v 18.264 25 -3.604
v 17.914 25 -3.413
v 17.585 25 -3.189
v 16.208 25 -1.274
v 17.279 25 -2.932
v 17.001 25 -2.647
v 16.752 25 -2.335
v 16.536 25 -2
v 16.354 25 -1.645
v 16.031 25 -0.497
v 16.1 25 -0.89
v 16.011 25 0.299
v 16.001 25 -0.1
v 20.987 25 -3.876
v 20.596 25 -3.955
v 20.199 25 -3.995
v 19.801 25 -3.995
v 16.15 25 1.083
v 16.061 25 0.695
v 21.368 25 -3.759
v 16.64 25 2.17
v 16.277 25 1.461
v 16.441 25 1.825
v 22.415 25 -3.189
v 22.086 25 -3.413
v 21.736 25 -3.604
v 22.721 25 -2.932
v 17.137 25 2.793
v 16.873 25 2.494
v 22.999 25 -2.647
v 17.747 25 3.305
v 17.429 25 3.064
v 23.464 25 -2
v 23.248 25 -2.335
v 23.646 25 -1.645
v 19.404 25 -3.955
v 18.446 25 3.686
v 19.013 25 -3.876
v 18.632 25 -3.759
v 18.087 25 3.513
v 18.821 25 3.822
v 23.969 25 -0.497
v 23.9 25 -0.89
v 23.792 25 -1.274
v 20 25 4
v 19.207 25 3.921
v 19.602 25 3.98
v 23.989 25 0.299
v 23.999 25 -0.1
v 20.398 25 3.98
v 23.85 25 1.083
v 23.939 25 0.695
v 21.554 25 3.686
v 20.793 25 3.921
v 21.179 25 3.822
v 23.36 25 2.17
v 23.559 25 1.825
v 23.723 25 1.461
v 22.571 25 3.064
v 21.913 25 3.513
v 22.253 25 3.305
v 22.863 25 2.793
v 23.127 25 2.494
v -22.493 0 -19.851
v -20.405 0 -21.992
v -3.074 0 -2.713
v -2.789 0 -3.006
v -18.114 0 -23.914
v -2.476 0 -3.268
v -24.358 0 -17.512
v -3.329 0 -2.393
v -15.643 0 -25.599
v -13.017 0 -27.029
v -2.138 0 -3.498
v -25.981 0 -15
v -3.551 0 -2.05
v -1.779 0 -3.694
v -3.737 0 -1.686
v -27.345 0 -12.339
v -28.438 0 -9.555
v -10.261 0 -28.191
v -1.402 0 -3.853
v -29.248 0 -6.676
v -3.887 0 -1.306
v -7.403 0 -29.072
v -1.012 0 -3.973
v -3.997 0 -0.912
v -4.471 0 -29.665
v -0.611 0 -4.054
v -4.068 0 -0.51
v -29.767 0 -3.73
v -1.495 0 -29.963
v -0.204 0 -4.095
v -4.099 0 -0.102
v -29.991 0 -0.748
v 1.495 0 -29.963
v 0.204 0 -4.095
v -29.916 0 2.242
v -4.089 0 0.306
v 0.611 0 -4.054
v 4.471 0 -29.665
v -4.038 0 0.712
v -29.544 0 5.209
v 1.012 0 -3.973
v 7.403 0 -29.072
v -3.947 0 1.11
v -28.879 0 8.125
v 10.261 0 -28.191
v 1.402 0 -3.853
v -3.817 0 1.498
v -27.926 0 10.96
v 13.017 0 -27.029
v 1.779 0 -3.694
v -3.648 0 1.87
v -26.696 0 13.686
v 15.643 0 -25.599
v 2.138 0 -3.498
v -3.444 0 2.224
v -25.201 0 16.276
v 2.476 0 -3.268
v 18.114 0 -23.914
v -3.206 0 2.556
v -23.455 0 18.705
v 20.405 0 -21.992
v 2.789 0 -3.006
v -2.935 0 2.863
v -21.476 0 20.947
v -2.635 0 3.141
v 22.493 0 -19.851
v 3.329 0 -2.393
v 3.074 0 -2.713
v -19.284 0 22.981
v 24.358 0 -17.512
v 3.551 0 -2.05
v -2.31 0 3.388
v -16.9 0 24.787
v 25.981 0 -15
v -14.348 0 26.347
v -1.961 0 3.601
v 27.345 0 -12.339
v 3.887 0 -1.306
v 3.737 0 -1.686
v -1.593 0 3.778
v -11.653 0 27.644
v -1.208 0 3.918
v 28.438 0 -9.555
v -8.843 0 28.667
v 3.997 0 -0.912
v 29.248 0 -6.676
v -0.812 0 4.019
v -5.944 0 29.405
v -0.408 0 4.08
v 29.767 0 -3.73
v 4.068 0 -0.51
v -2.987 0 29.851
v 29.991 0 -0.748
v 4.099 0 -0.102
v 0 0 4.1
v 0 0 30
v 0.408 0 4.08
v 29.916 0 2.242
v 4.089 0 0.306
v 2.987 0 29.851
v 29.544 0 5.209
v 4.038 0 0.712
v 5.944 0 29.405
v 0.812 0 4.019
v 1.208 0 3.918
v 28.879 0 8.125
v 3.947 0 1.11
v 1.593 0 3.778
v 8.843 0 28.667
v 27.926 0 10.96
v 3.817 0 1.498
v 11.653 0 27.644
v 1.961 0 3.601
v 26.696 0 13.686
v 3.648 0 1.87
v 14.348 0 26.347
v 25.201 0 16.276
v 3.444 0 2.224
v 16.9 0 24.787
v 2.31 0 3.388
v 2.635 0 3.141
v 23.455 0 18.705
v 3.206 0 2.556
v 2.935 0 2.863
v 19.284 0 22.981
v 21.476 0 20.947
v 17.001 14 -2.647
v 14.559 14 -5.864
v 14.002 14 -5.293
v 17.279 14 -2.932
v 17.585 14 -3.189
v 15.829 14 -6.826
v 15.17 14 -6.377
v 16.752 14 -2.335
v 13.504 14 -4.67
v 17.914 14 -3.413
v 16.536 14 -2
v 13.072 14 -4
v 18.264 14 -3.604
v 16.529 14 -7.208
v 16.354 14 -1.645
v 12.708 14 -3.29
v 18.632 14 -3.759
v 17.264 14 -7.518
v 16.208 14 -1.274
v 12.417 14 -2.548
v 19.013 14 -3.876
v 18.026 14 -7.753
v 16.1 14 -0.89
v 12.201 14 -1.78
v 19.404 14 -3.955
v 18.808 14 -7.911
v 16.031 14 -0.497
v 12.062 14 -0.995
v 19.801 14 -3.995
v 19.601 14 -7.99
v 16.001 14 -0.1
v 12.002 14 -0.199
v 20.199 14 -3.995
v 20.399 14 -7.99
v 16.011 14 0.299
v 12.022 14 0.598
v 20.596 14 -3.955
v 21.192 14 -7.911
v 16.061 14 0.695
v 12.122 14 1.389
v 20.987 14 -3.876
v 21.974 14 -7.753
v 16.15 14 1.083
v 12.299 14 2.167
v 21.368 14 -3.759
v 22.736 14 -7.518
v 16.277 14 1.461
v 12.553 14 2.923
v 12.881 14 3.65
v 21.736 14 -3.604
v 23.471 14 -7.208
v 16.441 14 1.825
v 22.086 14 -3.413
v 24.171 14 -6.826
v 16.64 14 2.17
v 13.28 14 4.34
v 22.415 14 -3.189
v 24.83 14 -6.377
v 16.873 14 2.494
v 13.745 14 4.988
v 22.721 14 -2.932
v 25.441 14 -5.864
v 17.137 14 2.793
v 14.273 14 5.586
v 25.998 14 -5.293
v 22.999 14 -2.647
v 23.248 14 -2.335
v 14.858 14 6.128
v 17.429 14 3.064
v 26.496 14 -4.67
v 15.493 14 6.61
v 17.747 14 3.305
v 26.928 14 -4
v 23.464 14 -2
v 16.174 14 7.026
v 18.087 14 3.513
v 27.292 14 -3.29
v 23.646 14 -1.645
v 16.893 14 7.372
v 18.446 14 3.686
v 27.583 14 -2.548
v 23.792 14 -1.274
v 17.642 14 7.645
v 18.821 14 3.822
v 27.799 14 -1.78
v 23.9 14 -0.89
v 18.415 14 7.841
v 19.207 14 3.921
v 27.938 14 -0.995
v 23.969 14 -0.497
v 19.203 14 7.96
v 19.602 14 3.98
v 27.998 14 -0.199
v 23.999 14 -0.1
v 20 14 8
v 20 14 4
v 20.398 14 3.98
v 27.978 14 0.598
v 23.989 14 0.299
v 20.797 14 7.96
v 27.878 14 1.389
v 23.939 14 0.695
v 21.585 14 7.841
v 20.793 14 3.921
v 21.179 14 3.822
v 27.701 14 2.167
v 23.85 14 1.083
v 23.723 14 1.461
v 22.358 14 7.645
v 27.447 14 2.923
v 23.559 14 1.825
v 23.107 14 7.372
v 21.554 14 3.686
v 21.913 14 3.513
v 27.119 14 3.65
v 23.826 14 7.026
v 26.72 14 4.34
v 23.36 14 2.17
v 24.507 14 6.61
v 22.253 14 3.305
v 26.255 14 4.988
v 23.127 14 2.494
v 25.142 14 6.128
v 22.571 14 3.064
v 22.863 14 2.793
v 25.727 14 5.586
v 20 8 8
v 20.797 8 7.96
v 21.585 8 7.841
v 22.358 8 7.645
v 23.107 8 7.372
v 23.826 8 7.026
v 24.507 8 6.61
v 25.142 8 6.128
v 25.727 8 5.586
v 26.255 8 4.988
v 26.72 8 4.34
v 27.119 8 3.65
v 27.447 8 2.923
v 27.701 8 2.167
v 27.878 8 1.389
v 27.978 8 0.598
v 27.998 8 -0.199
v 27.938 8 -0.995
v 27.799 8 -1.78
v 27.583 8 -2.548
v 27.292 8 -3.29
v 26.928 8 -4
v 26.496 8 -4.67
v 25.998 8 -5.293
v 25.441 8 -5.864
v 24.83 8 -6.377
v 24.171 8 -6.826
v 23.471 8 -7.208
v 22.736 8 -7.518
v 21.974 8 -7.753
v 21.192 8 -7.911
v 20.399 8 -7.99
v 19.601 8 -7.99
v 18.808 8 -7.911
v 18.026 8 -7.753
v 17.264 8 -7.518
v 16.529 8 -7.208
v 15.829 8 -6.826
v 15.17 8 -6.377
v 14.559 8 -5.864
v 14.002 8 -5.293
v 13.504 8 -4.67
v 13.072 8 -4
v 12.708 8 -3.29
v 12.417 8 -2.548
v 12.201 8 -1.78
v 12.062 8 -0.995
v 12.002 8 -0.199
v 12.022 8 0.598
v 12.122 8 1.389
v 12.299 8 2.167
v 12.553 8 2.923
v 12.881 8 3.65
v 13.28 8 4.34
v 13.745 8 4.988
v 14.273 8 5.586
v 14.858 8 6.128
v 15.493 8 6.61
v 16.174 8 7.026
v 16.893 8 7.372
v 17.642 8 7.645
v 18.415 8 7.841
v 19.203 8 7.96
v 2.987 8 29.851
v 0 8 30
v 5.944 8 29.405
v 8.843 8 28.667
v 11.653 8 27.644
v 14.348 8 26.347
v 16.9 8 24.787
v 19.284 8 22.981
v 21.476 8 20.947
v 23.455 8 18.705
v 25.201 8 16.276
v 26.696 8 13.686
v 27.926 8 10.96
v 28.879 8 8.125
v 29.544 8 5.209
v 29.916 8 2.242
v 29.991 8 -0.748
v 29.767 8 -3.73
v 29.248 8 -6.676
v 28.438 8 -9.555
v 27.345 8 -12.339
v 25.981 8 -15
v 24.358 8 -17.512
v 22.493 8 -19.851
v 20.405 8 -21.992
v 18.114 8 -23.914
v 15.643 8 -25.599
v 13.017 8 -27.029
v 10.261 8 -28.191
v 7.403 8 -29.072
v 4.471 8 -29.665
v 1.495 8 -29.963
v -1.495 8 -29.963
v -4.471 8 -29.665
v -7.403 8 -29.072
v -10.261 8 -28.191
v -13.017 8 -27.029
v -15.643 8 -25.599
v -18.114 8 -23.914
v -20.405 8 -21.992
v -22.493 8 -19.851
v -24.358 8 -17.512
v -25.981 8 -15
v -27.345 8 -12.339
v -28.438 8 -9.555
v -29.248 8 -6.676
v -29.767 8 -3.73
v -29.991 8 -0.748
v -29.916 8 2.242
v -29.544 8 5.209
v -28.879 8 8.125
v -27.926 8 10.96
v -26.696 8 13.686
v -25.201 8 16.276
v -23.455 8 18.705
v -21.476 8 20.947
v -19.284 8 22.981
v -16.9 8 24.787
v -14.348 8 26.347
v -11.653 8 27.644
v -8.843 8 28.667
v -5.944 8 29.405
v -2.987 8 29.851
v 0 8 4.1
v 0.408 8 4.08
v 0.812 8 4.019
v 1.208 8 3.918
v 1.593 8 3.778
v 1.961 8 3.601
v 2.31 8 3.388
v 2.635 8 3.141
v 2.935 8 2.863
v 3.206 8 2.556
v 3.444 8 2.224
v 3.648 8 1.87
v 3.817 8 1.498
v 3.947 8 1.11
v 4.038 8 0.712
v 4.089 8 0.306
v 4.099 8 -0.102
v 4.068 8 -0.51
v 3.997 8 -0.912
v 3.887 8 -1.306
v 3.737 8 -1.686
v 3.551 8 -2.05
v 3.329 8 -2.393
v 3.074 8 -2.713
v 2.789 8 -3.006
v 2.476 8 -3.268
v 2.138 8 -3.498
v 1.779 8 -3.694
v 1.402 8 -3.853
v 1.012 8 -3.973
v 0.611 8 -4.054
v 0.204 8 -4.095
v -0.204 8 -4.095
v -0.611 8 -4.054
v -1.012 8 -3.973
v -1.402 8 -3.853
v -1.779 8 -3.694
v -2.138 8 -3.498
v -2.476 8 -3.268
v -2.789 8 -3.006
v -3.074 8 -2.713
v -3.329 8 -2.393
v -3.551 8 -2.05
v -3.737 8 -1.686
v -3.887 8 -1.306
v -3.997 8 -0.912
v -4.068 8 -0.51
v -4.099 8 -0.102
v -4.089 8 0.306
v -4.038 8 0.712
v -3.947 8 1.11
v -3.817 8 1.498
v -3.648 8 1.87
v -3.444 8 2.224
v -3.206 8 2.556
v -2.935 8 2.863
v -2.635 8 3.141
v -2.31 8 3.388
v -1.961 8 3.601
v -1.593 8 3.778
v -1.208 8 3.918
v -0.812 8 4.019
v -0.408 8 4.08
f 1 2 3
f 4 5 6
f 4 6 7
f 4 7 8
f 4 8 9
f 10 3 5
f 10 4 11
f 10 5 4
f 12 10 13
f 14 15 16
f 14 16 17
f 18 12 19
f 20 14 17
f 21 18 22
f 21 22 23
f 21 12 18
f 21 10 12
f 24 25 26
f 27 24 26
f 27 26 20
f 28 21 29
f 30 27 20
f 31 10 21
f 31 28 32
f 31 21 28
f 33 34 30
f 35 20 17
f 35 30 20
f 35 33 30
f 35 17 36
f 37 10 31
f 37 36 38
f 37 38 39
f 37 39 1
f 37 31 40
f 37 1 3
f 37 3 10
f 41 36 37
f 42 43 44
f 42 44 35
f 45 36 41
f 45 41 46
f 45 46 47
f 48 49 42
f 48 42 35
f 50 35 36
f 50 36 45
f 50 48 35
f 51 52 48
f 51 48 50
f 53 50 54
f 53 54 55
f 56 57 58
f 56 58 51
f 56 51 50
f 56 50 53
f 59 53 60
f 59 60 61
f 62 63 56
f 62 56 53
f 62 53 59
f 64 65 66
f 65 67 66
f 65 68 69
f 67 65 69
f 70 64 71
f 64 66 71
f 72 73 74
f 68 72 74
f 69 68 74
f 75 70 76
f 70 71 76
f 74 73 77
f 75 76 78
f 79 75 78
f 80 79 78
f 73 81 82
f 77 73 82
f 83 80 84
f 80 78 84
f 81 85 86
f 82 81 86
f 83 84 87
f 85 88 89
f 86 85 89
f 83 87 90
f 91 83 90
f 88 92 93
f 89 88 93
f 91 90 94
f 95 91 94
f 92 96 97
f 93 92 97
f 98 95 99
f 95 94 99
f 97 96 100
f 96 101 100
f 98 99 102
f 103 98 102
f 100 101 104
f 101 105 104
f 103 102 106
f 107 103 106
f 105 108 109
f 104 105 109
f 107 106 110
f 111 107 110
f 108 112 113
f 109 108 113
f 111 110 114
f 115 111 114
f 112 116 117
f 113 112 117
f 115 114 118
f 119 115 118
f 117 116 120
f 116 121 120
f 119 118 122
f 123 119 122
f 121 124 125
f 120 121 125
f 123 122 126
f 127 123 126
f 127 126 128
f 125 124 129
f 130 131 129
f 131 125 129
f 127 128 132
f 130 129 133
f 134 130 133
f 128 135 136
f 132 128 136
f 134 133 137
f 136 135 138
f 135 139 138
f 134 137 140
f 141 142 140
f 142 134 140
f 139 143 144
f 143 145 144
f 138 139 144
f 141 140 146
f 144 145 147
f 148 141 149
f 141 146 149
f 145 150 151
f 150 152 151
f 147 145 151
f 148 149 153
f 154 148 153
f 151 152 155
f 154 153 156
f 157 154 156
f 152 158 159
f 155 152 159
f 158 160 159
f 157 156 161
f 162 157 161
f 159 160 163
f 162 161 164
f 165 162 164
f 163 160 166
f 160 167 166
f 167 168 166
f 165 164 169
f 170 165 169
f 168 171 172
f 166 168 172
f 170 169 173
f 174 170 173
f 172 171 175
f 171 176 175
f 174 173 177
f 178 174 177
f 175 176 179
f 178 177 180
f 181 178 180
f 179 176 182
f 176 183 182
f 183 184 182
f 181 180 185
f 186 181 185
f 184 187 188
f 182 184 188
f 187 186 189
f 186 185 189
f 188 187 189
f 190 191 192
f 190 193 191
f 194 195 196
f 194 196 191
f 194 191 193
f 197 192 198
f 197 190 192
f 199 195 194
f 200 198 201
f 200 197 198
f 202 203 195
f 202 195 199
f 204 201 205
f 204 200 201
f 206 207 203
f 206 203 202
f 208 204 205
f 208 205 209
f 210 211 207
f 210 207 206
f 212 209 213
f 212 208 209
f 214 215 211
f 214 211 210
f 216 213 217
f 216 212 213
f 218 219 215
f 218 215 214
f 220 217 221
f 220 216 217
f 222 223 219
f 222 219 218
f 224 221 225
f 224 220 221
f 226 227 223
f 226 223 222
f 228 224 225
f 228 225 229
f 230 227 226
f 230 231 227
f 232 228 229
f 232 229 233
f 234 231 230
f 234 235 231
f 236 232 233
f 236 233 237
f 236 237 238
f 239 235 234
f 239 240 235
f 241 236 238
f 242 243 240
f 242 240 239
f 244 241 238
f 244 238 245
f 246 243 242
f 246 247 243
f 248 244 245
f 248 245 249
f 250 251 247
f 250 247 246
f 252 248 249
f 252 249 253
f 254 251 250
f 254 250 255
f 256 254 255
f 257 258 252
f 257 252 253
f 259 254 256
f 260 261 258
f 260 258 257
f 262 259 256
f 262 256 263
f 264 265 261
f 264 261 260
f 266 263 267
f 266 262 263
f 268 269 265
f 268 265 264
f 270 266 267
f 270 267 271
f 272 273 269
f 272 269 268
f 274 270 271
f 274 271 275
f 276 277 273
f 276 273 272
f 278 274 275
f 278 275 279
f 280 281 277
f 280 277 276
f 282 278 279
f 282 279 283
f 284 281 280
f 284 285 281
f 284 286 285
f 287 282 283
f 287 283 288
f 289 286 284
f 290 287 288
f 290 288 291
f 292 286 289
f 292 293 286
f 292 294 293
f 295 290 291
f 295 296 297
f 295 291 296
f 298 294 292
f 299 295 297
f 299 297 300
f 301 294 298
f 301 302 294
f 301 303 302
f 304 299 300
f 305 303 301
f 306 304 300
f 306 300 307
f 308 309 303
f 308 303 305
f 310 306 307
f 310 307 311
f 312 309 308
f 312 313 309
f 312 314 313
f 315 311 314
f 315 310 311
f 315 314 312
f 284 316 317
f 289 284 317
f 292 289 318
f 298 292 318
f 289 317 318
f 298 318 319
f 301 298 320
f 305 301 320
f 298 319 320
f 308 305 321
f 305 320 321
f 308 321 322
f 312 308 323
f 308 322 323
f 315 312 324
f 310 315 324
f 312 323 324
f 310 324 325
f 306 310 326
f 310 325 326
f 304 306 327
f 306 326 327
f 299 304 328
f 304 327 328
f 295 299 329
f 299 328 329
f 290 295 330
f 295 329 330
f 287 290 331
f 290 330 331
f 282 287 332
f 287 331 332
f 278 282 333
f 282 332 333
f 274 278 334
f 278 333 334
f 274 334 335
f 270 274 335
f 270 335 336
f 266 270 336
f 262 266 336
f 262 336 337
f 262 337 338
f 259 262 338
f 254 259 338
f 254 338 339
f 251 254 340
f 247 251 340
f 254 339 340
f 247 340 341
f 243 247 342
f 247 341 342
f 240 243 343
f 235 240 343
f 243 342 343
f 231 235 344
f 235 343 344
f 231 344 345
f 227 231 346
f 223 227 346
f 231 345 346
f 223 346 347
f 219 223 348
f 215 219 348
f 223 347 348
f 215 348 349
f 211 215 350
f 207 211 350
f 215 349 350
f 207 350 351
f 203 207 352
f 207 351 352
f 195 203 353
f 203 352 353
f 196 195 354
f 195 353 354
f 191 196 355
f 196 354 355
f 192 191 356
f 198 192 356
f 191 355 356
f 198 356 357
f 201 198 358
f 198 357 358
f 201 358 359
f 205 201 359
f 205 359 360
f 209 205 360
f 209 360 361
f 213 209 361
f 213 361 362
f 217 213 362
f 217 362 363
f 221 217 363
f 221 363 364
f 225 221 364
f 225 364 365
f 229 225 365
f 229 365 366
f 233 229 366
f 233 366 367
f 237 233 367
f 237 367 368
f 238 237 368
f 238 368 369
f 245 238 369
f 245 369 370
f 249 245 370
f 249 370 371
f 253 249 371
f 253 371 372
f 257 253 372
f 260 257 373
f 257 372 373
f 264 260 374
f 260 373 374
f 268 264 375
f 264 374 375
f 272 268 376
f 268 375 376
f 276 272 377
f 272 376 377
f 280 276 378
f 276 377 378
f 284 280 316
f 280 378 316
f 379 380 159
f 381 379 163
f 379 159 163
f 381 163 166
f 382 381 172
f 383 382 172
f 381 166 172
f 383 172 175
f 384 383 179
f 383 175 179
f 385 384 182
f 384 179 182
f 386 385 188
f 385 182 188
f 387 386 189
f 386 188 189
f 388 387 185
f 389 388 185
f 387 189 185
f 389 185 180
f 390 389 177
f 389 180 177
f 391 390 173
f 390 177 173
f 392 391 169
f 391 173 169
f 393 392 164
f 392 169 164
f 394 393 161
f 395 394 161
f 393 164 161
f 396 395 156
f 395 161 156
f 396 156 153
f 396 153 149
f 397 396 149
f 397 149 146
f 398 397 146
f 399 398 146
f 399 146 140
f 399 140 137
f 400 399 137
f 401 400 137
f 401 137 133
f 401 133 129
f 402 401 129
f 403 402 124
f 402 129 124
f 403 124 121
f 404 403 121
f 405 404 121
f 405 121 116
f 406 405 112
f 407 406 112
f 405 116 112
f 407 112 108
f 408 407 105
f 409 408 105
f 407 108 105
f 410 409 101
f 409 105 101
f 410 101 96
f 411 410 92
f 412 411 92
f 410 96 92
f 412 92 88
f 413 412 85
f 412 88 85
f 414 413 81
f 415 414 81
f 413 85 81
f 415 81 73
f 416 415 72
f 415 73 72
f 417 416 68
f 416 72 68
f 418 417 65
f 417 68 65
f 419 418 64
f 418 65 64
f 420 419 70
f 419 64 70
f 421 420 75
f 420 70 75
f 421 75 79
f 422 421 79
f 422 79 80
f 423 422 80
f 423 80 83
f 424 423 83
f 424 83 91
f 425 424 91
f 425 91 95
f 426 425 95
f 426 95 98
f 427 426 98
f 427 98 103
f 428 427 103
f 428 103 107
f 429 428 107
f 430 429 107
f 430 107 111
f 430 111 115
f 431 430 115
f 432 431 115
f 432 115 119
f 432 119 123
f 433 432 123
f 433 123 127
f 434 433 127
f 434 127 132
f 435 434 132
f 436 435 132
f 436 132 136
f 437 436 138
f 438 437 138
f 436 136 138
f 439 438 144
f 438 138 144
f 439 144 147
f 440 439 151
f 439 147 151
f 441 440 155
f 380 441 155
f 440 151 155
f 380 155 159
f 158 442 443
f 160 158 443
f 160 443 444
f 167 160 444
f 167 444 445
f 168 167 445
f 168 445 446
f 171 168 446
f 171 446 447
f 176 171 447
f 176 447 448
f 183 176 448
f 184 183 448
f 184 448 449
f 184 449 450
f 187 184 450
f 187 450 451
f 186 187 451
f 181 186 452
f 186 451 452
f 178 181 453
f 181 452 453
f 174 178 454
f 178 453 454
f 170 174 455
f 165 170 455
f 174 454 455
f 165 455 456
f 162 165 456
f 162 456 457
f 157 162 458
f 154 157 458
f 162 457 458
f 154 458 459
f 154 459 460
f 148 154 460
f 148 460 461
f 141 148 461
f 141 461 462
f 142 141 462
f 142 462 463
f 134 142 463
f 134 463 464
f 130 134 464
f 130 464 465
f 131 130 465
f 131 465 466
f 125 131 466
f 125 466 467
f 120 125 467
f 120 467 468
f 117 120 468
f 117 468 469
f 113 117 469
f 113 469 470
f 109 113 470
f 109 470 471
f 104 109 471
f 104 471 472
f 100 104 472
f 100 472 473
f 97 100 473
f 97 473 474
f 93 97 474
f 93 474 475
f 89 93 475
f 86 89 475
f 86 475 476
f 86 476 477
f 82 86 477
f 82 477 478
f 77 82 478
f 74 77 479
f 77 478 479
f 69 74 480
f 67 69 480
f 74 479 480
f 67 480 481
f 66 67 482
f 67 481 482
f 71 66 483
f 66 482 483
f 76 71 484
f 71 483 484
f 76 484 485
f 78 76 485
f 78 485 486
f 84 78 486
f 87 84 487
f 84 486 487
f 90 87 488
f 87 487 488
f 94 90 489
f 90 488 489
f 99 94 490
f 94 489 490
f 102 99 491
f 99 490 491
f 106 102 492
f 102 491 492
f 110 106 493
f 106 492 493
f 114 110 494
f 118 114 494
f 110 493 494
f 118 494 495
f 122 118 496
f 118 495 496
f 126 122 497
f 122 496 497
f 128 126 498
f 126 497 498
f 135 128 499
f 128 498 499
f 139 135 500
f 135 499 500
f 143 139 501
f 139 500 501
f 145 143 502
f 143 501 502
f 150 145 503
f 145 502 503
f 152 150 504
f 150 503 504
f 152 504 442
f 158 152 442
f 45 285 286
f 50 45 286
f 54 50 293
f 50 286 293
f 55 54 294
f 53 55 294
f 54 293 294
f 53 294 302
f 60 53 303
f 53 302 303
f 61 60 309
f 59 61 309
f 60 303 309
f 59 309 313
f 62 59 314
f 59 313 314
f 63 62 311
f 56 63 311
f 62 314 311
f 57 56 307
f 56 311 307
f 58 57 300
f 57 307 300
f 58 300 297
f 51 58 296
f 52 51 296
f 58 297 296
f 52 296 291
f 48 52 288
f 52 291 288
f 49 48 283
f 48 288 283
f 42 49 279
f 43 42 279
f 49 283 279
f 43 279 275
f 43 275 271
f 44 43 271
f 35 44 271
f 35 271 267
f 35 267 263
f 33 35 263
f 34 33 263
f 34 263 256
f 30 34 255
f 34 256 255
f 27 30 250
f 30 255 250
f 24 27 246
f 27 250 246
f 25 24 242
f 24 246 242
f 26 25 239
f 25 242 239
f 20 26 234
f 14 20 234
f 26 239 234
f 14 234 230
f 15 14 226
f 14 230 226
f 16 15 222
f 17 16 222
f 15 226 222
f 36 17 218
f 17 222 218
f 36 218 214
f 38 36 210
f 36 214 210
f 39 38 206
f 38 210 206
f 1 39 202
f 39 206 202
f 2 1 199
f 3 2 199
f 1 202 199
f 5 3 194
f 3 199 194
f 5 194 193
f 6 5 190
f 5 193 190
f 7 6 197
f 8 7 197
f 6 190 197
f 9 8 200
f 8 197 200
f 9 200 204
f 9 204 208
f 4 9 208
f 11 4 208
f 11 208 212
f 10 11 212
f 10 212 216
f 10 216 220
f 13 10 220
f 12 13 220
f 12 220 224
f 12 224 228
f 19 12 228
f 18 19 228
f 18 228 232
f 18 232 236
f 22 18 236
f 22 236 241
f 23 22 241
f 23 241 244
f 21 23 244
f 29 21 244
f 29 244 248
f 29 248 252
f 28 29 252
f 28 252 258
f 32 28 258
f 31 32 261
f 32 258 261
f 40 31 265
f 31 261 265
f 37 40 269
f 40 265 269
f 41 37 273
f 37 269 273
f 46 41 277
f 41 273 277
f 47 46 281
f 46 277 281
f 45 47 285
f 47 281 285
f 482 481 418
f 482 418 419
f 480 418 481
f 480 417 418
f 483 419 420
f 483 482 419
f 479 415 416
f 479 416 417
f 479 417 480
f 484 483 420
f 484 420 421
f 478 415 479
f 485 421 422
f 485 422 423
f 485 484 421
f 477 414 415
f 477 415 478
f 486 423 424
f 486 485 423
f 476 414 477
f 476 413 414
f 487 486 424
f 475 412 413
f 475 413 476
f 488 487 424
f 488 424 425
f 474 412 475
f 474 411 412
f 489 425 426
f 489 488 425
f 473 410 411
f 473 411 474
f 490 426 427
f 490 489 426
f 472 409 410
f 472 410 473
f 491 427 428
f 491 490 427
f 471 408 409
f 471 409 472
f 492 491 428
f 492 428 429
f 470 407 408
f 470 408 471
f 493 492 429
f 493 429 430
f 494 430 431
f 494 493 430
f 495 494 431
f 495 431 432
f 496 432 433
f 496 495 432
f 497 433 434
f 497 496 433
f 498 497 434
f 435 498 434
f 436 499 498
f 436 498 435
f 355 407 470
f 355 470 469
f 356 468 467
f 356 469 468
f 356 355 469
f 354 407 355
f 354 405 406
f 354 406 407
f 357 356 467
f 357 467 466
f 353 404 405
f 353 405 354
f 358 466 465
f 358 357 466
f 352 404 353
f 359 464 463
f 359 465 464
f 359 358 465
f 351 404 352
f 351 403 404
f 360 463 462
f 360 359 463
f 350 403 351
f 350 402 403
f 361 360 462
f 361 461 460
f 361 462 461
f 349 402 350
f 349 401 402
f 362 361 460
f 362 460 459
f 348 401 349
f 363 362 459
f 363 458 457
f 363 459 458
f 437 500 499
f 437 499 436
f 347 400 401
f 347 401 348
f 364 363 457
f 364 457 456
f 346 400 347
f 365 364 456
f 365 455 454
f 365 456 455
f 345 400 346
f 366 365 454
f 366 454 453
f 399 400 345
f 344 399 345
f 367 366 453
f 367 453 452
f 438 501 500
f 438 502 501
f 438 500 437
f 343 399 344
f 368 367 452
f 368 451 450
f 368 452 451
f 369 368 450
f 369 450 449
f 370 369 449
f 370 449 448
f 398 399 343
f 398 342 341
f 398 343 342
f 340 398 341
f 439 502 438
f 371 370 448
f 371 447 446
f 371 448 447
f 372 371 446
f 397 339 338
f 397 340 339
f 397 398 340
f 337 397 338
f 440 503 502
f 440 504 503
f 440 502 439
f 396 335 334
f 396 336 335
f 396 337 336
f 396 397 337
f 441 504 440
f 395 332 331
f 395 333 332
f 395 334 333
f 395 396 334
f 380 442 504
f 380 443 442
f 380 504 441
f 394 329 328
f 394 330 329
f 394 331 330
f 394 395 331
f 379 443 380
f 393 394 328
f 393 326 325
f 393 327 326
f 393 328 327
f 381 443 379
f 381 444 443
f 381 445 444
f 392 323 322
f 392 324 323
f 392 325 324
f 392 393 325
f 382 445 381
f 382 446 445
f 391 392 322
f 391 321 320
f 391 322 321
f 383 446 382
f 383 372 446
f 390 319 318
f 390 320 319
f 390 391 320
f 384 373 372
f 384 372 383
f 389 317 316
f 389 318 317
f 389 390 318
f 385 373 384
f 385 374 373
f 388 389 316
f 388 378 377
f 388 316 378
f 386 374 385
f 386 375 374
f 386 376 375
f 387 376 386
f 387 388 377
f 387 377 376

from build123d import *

# Parameters (mm, degrees)
SKETCH_1_R          = 30
EXTRUDE_1_DEPTH     = 8
SKETCH_2_R          = 4.1
CUT_EXTRUDE_1_DEPTH = 44.17406629
SKETCH_3_R          = 8
EXTRUDE_2_DEPTH     = 6
SKETCH_4_R          = 4
EXTRUDE_3_DEPTH     = 11


with BuildPart() as part:
    # 草图1 → 凸台-拉伸1 (new body)
    with BuildSketch(Plane(origin=(0, 0, 0), x_dir=(1, 0, 0), z_dir=(0, 1, 0))):
        with Locations(Location((0, 0, 0), (0, 0, 270))):
            Circle(SKETCH_1_R)
    extrude(amount=EXTRUDE_1_DEPTH)

    # 草图2 → 切除-拉伸1 (cut, through all)
    with BuildSketch(Plane(origin=(0, 8, 0), x_dir=(1, 0, 0), z_dir=(0, 1, 0))):
        with Locations(Location((0, 0, 0), (0, 0, 270))):
            Circle(SKETCH_2_R)
    extrude(amount=-CUT_EXTRUDE_1_DEPTH, mode=Mode.SUBTRACT)

    # 草图3 → 凸台-拉伸2 (add)
    with BuildSketch(Plane(origin=(0, 8, 0), x_dir=(1, 0, 0), z_dir=(0, 1, 0))):
        with Locations(Location((20, 0, 0), (0, 0, 270))):
            Circle(SKETCH_3_R)
    extrude(amount=EXTRUDE_2_DEPTH)

    # 草图4 → 凸台-拉伸3 (add)
    with BuildSketch(Plane(origin=(0, 14, 0), x_dir=(1, 0, 0), z_dir=(0, 1, 0))):
        with Locations(Location((20, 0, 0), (0, 0, 270))):
            Circle(SKETCH_4_R)
    extrude(amount=EXTRUDE_3_DEPTH)


solid = part.part
